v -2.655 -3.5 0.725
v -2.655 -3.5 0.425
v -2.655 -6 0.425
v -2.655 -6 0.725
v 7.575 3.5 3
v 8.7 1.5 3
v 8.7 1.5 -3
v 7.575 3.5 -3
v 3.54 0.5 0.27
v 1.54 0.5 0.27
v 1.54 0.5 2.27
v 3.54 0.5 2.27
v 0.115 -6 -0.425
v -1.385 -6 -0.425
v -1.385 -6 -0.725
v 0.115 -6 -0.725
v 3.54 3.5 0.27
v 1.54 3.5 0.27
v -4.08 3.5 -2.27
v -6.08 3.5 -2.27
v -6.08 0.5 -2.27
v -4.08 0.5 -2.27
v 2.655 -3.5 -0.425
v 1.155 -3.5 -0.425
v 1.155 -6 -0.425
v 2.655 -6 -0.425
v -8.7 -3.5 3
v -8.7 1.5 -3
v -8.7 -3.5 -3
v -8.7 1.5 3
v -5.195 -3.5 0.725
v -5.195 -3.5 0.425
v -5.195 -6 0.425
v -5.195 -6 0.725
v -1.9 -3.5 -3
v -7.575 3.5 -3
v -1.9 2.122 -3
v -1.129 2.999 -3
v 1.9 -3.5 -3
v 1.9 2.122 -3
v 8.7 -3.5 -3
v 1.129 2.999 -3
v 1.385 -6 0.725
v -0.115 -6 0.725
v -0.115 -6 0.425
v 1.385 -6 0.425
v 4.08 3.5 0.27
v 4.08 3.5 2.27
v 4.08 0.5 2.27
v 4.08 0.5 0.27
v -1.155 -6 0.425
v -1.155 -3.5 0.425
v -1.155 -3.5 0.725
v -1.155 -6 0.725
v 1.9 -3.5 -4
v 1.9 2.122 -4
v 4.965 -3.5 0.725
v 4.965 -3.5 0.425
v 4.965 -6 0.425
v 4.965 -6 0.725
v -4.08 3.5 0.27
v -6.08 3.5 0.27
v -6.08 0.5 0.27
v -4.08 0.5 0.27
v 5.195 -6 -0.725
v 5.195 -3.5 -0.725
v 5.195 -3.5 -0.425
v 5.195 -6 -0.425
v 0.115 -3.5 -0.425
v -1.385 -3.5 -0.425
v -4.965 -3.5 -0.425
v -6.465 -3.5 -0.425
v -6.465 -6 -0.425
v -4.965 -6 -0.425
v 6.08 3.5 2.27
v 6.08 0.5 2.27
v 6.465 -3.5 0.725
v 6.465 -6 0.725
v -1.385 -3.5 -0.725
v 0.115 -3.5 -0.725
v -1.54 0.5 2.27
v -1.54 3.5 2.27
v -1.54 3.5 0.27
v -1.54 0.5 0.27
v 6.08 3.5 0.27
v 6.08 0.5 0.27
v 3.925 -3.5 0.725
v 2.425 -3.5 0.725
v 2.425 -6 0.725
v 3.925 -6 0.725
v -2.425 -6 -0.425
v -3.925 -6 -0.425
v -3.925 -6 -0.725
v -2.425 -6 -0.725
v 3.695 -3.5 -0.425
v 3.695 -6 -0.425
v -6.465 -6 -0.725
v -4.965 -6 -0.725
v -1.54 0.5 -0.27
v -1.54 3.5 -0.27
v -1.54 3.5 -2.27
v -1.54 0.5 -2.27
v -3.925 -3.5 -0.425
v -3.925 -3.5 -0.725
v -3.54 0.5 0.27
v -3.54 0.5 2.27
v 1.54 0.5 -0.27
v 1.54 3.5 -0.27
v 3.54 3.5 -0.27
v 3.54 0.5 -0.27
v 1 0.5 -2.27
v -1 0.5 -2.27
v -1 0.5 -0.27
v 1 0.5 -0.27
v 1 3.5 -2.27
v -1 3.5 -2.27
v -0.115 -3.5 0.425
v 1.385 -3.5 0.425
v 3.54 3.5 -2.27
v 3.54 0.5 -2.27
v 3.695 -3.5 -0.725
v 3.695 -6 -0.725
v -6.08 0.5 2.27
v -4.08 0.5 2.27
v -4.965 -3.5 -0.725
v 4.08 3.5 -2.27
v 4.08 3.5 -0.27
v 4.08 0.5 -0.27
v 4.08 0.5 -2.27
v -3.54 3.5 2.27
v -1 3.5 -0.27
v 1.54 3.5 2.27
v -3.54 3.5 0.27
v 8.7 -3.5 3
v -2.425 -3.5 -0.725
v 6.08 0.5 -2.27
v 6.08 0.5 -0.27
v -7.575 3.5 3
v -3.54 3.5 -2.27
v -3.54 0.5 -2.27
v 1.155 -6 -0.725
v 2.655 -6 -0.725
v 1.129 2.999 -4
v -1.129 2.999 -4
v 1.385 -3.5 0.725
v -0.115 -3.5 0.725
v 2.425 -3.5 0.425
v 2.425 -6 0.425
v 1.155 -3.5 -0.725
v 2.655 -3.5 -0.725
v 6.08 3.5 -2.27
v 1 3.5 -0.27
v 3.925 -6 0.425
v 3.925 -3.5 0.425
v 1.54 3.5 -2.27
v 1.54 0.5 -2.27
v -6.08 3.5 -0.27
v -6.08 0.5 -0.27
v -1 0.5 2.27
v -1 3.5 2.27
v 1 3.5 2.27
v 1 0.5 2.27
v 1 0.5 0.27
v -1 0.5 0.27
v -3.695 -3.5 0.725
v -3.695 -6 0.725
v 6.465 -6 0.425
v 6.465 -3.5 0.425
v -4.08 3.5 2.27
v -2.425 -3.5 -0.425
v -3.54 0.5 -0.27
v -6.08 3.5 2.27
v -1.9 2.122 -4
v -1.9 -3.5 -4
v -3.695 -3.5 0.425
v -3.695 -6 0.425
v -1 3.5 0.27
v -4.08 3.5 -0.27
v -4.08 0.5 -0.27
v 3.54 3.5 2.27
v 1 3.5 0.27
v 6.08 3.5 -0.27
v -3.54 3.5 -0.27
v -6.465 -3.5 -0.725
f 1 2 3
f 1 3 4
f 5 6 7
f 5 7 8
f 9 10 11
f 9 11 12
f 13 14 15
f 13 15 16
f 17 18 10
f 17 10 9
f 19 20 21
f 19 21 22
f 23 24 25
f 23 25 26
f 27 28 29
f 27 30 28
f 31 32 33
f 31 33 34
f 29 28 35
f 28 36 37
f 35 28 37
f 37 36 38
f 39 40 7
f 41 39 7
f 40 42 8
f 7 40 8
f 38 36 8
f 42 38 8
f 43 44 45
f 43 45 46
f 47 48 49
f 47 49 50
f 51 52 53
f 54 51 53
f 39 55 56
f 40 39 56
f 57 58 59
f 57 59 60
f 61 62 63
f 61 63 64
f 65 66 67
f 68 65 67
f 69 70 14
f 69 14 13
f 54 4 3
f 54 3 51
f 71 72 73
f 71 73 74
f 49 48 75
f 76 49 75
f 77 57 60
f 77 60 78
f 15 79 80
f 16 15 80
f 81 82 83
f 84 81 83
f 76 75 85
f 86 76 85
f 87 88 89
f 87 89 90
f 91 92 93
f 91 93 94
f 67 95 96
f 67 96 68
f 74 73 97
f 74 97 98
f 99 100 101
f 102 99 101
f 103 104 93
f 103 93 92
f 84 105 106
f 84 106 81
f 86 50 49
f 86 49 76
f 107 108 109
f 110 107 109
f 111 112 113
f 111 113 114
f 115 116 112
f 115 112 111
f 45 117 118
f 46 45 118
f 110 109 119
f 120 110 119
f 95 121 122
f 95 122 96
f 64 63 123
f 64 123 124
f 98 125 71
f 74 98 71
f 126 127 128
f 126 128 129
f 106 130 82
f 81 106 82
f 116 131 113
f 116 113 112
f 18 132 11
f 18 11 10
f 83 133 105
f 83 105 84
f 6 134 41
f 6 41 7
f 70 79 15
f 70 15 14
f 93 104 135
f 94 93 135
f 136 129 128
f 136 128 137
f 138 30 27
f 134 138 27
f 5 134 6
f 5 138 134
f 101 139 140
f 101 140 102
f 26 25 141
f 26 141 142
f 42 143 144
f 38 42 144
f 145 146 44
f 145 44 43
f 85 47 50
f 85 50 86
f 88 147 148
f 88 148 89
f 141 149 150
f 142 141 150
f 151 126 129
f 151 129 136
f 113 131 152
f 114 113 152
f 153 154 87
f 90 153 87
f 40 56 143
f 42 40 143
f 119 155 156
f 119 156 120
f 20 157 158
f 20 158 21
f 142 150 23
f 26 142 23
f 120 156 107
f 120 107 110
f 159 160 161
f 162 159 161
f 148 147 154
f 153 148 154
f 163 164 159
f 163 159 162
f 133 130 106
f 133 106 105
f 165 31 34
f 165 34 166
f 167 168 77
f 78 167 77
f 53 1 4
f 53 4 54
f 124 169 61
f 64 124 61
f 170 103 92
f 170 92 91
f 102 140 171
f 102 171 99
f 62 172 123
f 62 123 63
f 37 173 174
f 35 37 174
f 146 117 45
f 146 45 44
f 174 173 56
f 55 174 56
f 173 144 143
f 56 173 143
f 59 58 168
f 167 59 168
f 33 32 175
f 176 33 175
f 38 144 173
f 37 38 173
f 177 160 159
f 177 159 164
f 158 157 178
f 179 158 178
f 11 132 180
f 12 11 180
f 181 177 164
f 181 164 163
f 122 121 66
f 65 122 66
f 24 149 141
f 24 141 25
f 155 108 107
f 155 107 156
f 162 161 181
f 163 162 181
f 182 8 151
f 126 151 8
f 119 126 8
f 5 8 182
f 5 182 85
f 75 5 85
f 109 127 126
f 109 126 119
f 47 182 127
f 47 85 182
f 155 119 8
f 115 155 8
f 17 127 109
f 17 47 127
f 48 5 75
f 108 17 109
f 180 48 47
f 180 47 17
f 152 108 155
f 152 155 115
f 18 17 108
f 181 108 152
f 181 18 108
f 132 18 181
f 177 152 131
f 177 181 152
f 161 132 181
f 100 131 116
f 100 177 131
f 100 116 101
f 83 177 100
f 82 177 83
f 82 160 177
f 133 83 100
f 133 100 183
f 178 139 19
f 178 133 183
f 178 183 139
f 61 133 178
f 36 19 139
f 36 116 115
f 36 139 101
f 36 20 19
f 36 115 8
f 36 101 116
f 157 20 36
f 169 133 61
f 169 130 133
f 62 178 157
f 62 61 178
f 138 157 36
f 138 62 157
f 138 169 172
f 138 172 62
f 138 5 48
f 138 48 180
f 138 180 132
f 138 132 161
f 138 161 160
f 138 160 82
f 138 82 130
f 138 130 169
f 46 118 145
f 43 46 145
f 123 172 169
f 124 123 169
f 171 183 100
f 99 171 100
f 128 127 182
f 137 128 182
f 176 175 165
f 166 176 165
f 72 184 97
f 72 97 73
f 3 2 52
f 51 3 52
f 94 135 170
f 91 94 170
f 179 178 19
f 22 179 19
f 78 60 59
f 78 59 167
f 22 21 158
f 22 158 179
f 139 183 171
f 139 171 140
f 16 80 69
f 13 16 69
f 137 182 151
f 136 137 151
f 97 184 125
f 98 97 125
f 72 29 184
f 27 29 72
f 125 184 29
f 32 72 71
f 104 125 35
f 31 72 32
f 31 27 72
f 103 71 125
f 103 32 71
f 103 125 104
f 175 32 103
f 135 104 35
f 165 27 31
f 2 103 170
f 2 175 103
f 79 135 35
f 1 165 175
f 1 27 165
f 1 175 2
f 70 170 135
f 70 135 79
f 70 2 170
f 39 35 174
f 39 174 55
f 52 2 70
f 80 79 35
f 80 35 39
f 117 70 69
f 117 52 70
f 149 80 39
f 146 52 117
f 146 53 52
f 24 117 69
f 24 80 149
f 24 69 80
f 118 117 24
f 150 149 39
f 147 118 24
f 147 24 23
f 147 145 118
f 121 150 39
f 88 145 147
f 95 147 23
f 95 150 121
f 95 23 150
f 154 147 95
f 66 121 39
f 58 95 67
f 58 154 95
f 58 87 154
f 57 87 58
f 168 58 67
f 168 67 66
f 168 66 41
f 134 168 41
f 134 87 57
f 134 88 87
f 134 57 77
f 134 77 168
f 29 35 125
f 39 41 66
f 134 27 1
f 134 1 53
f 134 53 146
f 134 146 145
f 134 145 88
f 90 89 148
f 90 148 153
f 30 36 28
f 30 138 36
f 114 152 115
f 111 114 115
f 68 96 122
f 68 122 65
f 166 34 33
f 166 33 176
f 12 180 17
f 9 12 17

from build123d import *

# Parameters (mm, degrees)
EXTRUDE_1_DEPTH     = 3
EXTRUDE_START       = -4
EXTRUDE_2_DEPTH     = 1
SKETCH_2_W          = 2
SKETCH_2_H          = 2
CUT_EXTRUDE_1_DEPTH = 3
SKETCH_3_W          = 1.5
SKETCH_3_H          = 0.3
EXTRUDE_3_DEPTH     = 2.5


with BuildPart() as part:
    # Эскиз1 → Бобышка-Вытянуть1 (new, symmetric)
    with BuildSketch(Plane.XY):
        Polygon((-8.7, 1.5), (-8.7, -3.5), (-1.9, -3.5), (-1.9, 2.122094745), (-1.129392625, 2.998992793), (1.129392625, 2.998992793), (1.9, 2.122094745), (1.9, -3.5), (8.7, -3.5), (8.7, 1.5), (7.575, 3.5), (-7.575, 3.5), align=None)
        Polygon((-1.9, 2.122094745), (-1.9, -3.5), (1.9, -3.5), (1.9, 2.122094745), (1.129392625, 2.998992793), (-1.129392625, 2.998992793), align=None)
    extrude(amount=EXTRUDE_1_DEPTH, both=True)

    # Эскиз1<3> → Бобышка-Вытянуть2 (add)
    with BuildSketch(Plane.XY.offset(EXTRUDE_START)):
        Polygon((-1.9, 2.122094745), (-1.9, -3.5), (1.9, -3.5), (1.9, 2.122094745), (1.129392625, 2.998992793), (-1.129392625, 2.998992793), align=None)
    extrude(amount=EXTRUDE_2_DEPTH)

    # Эскиз2 → Вырез-Вытянуть1 (cut)
    with BuildSketch(Plane(origin=(0, 3.5, 0), x_dir=(1, 0, 0), z_dir=(0, 1, 0))):
        with Locations((0, 1.27)):
            Rectangle(SKETCH_2_W, SKETCH_2_H)
        with Locations((0, -1.27)):
            Rectangle(SKETCH_2_W, SKETCH_2_H)
        with Locations((2.54, 1.27)):
            Rectangle(SKETCH_2_W, SKETCH_2_H)
        with Locations((2.54, -1.27)):
            Rectangle(SKETCH_2_W, SKETCH_2_H)
        with Locations((-2.54, 1.27)):
            Rectangle(SKETCH_2_W, SKETCH_2_H)
        with Locations((-2.54, -1.27)):
            Rectangle(SKETCH_2_W, SKETCH_2_H)
        with Locations((-5.08, 1.27)):
            Rectangle(SKETCH_2_W, SKETCH_2_H)
        with Locations((-5.08, -1.27)):
            Rectangle(SKETCH_2_W, SKETCH_2_H)
        with Locations((5.08, 1.27)):
            Rectangle(SKETCH_2_W, SKETCH_2_H)
        with Locations((5.08, -1.27)):
            Rectangle(SKETCH_2_W, SKETCH_2_H)
    extrude(amount=-CUT_EXTRUDE_1_DEPTH, mode=Mode.SUBTRACT)

    # Эскиз3 → Бобышка-Вытянуть3 (add)
    with BuildSketch(Plane.XZ.offset(3.5)):
        with Locations((-3.175, -0.575)):
            Rectangle(SKETCH_3_W, SKETCH_3_H)
        with Locations((-1.905, 0.575)):
            Rectangle(SKETCH_3_W, SKETCH_3_H)
        with Locations((-0.635, -0.575)):
            Rectangle(SKETCH_3_W, SKETCH_3_H)
        with Locations((0.635, 0.575)):
            Rectangle(SKETCH_3_W, SKETCH_3_H)
        with Locations((1.905, -0.575)):
            Rectangle(SKETCH_3_W, SKETCH_3_H)
        with Locations((3.175, 0.575)):
            Rectangle(SKETCH_3_W, SKETCH_3_H)
        with Locations((-4.445, 0.575)):
            Rectangle(SKETCH_3_W, SKETCH_3_H)
        with Locations((-5.715, -0.575)):
            Rectangle(SKETCH_3_W, SKETCH_3_H)
        with Locations((5.715, 0.575)):
            Rectangle(SKETCH_3_W, SKETCH_3_H)
        with Locations((4.445, -0.575)):
            Rectangle(SKETCH_3_W, SKETCH_3_H)
    extrude(amount=EXTRUDE_3_DEPTH)


solid = part.part
